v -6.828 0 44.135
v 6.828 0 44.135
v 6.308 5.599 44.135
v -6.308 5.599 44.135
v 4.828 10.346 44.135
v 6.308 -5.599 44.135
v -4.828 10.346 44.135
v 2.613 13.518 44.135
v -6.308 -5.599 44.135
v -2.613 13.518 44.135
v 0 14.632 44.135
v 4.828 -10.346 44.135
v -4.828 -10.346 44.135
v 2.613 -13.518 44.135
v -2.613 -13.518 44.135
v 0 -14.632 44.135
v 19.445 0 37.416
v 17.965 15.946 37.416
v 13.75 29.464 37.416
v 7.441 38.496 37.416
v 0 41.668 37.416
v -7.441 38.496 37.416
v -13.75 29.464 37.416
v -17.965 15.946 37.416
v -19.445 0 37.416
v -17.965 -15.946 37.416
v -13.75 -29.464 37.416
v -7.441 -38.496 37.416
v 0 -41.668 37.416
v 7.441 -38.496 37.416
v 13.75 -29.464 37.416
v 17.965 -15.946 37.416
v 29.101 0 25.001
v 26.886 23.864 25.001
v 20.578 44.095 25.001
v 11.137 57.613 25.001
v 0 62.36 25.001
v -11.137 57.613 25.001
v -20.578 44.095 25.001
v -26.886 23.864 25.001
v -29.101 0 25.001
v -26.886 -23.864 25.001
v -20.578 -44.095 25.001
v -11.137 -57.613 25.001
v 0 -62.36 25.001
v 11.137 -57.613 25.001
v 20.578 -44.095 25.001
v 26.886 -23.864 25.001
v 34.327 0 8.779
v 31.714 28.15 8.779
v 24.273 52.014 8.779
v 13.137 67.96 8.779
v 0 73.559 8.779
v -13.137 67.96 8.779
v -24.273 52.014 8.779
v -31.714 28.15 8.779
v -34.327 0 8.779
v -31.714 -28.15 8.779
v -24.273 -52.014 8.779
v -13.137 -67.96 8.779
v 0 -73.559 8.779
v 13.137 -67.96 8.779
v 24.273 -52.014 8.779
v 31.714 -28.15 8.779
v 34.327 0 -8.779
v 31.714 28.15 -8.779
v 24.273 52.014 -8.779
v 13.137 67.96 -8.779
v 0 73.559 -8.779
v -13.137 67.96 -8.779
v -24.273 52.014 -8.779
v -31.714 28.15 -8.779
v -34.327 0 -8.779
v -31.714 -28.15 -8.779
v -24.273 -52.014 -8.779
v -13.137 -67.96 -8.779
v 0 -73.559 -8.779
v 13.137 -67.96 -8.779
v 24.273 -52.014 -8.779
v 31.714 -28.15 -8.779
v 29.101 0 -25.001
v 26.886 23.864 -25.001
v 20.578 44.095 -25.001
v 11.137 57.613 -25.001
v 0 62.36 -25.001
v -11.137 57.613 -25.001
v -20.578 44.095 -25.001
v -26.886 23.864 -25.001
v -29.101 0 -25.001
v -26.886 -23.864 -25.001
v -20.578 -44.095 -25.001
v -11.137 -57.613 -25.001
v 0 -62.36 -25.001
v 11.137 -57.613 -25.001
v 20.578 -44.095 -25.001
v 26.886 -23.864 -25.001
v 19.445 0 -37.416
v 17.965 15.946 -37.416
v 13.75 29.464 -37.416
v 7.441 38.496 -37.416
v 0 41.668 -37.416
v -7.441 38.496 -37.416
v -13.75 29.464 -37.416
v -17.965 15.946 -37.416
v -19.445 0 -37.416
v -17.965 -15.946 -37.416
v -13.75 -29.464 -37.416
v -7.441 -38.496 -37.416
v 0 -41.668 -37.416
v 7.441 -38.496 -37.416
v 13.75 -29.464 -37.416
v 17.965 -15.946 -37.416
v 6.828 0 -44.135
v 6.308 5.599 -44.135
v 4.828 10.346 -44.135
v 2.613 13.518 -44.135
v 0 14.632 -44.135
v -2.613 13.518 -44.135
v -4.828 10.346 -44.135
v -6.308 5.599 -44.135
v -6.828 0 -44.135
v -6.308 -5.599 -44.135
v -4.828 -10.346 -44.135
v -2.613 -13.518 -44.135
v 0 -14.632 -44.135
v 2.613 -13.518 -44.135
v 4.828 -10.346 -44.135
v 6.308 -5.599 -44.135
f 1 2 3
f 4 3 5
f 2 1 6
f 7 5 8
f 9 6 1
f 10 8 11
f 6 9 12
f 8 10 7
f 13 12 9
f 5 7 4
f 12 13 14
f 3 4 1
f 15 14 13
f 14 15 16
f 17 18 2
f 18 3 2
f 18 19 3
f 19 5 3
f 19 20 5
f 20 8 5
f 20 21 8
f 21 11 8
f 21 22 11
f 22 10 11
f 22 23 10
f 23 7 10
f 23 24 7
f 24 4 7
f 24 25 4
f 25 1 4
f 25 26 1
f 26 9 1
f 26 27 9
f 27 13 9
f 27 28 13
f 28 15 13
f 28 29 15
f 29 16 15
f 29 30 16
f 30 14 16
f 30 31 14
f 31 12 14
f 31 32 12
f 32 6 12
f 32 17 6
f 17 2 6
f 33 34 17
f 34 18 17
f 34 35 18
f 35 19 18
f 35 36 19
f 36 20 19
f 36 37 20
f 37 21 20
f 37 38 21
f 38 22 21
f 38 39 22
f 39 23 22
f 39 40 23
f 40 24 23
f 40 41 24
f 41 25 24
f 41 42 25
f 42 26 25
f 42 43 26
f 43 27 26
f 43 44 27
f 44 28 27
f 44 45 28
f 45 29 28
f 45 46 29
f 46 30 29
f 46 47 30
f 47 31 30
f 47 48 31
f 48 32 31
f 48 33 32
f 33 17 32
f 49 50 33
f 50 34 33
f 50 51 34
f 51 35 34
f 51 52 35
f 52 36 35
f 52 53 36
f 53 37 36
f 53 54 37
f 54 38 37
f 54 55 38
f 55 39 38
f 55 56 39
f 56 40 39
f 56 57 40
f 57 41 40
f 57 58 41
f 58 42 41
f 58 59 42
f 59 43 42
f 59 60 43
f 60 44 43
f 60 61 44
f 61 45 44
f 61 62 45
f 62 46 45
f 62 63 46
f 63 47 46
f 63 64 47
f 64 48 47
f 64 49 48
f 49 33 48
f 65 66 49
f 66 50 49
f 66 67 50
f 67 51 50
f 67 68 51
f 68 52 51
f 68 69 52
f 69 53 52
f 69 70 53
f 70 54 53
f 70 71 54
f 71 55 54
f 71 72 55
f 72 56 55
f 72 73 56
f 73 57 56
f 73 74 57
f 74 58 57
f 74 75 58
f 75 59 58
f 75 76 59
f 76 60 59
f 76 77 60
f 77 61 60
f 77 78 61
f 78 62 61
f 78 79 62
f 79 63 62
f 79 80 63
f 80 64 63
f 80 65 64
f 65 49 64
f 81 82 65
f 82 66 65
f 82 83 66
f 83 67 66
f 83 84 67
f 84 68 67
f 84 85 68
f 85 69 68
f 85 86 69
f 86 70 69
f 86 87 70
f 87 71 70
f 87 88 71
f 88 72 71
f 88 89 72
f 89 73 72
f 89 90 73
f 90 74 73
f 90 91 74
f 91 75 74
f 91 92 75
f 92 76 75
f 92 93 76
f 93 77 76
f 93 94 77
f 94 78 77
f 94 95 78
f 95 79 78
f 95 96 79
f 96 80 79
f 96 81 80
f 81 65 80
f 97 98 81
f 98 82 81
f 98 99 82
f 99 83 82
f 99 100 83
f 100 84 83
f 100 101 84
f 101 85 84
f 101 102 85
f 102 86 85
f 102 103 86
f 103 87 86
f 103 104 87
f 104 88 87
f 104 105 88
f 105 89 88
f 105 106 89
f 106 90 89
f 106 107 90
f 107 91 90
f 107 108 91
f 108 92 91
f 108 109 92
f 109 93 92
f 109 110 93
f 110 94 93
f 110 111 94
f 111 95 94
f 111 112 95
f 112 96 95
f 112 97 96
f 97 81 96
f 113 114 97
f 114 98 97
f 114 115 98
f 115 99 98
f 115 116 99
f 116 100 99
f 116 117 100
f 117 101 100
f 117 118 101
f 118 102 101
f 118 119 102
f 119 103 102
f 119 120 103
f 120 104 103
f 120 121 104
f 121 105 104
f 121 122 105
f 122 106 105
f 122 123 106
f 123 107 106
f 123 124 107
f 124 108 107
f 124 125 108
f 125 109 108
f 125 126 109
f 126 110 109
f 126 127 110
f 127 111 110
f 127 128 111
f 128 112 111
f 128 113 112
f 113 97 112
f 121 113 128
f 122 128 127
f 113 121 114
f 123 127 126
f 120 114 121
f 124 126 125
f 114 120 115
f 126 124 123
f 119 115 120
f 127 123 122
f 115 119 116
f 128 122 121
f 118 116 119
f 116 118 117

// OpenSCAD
// Generated by SolidPython 1.0.1 on 2020-07-29 00:46:48


scale(v = [7, 15, 9]) {
	sphere(r = 5);
}
/***********************************************
*********      SolidPython code:      **********
************************************************
 
# import packages: SolidPython
from solid import *
from solid.utils import *
from itertools import chain, combinations, permutations


class Resize:

    def __init__(self, scad_file):
        self.scad_file = scad_file
        #self.scad_file = import_scad(scad_file)
        # cone/cylinder param:
        self.r1 = 0
        self.r2 = 0
        self.h = 0
        # rectangular prism param:
        self.w = 0
        self.l = 0
        # ellipse param:
        self.r = 0

    # import OpenScad code (file name corresponds to shape)


    # classify shape + parameters
    def assign(self, param1, param2, param3):
        if self.scad_file == 'cone.scad':
            self.r1 = param1
            self.r2 = param2
            self.h = param3
        elif self.scad_file == 'cylinder.scad':
            self.r1 = param1
            self.r2 = param2
            self.h = param3
        elif self.scad_file == 'rectangularPrism.scad':
            self.h = param1
            self.l = param2
            self.w = param3
        else:
            self.r = param1
            self.h = param2

    # resize parameters
    def iterate(self):
        x = range(3, 20, 2)
        i = 1
        if self.scad_file == 'cone.scad':
            tempList = list(permutations(x, 2))
            for temp in tempList:
                param1 = temp[0]
                param2 = temp[1]
                filepath = 'produced_scad_files/' + 'cone' + str(param1) + '_' + str(param2) + '_' + '.scad'
                scad_render_to_file(cylinder(h=param1, r1=param2, r2=0), filepath)

        elif self.scad_file == 'cylinder.scad':
            tempList = list(permutations(x, 3))
            for temp in tempList:
                param1 = temp[0]
                param2 = temp[1]
                filepath = 'produced_scad_files/' + 'cylinder' + str(param1) + '_' + str(param2) + '_' + '.scad'
                scad_render_to_file(cylinder(h=param1, r1=param2, r2=param2), filepath)

        elif self.scad_file == 'rectangularPrism.scad':
            tempList = list(permutations(x, 3))
            for temp in tempList:
                param1 = temp[0]
                param2 = temp[1]
                param3 = temp[2]
                filepath = 'produced_scad_files/' + 'rectangularPrism' + str(param1) + '_' + str(param2) + '_' + str(
                    param3) + '.scad'
                scad_render_to_file(cube(size=(param1, param2, param3)), filepath)

        elif self.scad_file == 'ellipse.scad':
            tempList = list(permutations(x, 4))
            for temp in tempList:
                param1 = temp[0]
                param2 = temp[1]
                param3 = temp[2]
                param4 = temp[3]
                filepath = 'produced_scad_files/' + 'ellipse' + str(param1) + '_' + str(param2) + '_' + str(param3) + '_' + str(param4) + '.scad'
                scad_render_to_file(scale([param1, param2, param3])(sphere(r=param4)), filepath)

    def render_to_scadfile(self):
        scad_render_to_file(scad, 'example.scad') 
 
************************************************/
